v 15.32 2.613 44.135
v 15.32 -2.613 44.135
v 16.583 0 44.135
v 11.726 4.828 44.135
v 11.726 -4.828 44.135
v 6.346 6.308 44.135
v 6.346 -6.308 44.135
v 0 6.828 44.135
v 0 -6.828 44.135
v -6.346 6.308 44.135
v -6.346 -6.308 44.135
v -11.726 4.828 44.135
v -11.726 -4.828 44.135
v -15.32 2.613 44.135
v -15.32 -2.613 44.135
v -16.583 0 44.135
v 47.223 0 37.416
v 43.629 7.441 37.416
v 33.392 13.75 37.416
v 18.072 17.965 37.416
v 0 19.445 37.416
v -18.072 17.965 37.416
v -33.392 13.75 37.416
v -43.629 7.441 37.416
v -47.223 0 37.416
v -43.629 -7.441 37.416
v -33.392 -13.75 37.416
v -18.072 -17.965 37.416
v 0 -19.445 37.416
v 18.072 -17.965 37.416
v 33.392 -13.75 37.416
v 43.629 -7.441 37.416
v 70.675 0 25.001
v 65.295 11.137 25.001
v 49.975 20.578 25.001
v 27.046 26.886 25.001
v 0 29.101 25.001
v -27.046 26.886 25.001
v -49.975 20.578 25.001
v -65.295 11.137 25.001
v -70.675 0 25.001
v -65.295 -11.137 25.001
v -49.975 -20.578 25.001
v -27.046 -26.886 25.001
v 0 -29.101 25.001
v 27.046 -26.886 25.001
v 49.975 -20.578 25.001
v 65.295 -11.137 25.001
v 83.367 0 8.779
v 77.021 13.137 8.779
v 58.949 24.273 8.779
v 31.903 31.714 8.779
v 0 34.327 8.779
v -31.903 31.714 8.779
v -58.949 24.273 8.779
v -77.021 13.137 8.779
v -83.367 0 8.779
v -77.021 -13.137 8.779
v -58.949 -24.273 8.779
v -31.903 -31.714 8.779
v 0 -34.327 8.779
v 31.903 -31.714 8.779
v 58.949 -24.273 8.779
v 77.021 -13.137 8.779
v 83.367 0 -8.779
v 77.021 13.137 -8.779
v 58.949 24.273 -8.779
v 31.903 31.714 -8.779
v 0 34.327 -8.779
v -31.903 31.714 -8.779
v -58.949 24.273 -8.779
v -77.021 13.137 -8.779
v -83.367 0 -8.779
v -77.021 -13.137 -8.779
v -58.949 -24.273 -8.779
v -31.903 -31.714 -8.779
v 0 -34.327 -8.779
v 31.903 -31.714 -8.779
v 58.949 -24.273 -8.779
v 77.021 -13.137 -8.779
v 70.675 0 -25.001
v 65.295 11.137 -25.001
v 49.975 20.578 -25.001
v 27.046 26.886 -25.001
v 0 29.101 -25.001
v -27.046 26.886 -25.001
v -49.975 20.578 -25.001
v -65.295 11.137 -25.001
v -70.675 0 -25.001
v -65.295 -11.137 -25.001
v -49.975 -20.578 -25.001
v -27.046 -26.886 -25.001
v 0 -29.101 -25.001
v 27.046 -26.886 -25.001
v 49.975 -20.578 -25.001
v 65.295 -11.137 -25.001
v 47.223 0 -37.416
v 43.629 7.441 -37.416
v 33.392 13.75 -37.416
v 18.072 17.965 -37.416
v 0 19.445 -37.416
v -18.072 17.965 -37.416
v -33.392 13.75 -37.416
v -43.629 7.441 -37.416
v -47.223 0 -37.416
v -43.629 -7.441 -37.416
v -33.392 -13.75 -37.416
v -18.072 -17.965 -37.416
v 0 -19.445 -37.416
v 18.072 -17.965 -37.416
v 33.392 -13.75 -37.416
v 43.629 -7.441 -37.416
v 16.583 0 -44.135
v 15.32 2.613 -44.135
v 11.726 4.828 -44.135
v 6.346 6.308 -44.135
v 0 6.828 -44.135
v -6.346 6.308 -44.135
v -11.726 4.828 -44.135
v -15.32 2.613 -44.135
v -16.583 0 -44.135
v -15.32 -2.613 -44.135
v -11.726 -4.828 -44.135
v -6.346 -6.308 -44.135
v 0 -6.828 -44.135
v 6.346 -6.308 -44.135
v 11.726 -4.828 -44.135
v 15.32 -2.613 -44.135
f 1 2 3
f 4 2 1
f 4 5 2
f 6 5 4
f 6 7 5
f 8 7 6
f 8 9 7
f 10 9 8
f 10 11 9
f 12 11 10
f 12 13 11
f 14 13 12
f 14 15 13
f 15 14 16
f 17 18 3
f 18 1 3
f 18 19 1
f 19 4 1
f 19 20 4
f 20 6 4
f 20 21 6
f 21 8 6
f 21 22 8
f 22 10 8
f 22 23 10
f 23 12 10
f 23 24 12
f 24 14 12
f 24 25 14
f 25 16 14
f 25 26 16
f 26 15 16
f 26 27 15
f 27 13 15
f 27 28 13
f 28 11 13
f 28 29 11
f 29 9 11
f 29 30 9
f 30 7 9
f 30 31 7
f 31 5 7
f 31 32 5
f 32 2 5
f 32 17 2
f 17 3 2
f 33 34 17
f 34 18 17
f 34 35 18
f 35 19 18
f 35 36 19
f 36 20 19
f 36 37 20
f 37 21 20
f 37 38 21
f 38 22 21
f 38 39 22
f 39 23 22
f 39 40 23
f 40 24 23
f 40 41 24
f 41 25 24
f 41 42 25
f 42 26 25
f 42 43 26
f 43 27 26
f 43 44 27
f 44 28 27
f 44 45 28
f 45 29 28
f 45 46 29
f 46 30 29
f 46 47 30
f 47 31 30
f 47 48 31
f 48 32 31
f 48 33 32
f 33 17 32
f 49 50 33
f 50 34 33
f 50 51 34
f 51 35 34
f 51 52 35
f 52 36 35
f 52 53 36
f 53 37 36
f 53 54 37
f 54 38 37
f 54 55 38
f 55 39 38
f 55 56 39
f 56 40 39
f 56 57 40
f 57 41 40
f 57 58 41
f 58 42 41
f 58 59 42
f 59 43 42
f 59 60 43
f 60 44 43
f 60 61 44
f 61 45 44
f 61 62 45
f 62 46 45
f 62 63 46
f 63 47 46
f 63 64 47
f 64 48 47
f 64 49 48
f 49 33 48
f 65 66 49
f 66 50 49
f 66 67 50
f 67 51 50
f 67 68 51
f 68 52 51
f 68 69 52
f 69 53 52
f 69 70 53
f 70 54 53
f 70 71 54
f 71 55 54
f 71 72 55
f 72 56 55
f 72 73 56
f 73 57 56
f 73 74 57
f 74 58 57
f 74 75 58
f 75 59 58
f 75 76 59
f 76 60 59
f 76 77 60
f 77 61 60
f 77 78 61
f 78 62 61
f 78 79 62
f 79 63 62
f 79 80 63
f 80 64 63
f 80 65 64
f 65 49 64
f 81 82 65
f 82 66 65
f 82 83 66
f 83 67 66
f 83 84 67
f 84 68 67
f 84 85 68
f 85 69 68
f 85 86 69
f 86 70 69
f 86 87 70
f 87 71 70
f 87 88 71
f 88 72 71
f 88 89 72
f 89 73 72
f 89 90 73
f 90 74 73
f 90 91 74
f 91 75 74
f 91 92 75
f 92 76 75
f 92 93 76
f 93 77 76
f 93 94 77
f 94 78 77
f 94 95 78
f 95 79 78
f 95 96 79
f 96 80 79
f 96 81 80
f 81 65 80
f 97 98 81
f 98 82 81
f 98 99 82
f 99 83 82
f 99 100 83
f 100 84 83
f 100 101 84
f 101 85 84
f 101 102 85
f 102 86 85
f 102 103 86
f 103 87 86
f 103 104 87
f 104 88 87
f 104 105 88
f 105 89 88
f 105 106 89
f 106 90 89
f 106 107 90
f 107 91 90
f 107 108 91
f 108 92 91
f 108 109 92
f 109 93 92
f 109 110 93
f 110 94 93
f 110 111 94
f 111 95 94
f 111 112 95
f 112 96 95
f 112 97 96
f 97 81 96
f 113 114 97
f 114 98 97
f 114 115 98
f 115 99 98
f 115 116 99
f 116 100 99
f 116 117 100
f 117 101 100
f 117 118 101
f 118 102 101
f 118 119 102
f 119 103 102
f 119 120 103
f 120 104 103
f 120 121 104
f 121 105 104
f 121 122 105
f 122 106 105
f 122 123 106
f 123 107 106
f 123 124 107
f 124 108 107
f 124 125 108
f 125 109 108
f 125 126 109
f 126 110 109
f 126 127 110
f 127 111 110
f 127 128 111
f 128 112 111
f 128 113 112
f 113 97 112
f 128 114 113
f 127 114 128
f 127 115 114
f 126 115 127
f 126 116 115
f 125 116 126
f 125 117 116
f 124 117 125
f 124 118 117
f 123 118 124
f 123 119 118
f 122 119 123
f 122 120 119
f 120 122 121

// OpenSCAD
// Generated by SolidPython 1.0.1 on 2020-07-29 00:46:52


scale(v = [17, 7, 9]) {
	sphere(r = 5);
}
/***********************************************
*********      SolidPython code:      **********
************************************************
 
# import packages: SolidPython
from solid import *
from solid.utils import *
from itertools import chain, combinations, permutations


class Resize:

    def __init__(self, scad_file):
        self.scad_file = scad_file
        #self.scad_file = import_scad(scad_file)
        # cone/cylinder param:
        self.r1 = 0
        self.r2 = 0
        self.h = 0
        # rectangular prism param:
        self.w = 0
        self.l = 0
        # ellipse param:
        self.r = 0

    # import OpenScad code (file name corresponds to shape)


    # classify shape + parameters
    def assign(self, param1, param2, param3):
        if self.scad_file == 'cone.scad':
            self.r1 = param1
            self.r2 = param2
            self.h = param3
        elif self.scad_file == 'cylinder.scad':
            self.r1 = param1
            self.r2 = param2
            self.h = param3
        elif self.scad_file == 'rectangularPrism.scad':
            self.h = param1
            self.l = param2
            self.w = param3
        else:
            self.r = param1
            self.h = param2

    # resize parameters
    def iterate(self):
        x = range(3, 20, 2)
        i = 1
        if self.scad_file == 'cone.scad':
            tempList = list(permutations(x, 2))
            for temp in tempList:
                param1 = temp[0]
                param2 = temp[1]
                filepath = 'produced_scad_files/' + 'cone' + str(param1) + '_' + str(param2) + '_' + '.scad'
                scad_render_to_file(cylinder(h=param1, r1=param2, r2=0), filepath)

        elif self.scad_file == 'cylinder.scad':
            tempList = list(permutations(x, 3))
            for temp in tempList:
                param1 = temp[0]
                param2 = temp[1]
                filepath = 'produced_scad_files/' + 'cylinder' + str(param1) + '_' + str(param2) + '_' + '.scad'
                scad_render_to_file(cylinder(h=param1, r1=param2, r2=param2), filepath)

        elif self.scad_file == 'rectangularPrism.scad':
            tempList = list(permutations(x, 3))
            for temp in tempList:
                param1 = temp[0]
                param2 = temp[1]
                param3 = temp[2]
                filepath = 'produced_scad_files/' + 'rectangularPrism' + str(param1) + '_' + str(param2) + '_' + str(
                    param3) + '.scad'
                scad_render_to_file(cube(size=(param1, param2, param3)), filepath)

        elif self.scad_file == 'ellipse.scad':
            tempList = list(permutations(x, 4))
            for temp in tempList:
                param1 = temp[0]
                param2 = temp[1]
                param3 = temp[2]
                param4 = temp[3]
                filepath = 'produced_scad_files/' + 'ellipse' + str(param1) + '_' + str(param2) + '_' + str(param3) + '_' + str(param4) + '.scad'
                scad_render_to_file(scale([param1, param2, param3])(sphere(r=param4)), filepath)

    def render_to_scadfile(self):
        scad_render_to_file(scad, 'example.scad') 
 
************************************************/
